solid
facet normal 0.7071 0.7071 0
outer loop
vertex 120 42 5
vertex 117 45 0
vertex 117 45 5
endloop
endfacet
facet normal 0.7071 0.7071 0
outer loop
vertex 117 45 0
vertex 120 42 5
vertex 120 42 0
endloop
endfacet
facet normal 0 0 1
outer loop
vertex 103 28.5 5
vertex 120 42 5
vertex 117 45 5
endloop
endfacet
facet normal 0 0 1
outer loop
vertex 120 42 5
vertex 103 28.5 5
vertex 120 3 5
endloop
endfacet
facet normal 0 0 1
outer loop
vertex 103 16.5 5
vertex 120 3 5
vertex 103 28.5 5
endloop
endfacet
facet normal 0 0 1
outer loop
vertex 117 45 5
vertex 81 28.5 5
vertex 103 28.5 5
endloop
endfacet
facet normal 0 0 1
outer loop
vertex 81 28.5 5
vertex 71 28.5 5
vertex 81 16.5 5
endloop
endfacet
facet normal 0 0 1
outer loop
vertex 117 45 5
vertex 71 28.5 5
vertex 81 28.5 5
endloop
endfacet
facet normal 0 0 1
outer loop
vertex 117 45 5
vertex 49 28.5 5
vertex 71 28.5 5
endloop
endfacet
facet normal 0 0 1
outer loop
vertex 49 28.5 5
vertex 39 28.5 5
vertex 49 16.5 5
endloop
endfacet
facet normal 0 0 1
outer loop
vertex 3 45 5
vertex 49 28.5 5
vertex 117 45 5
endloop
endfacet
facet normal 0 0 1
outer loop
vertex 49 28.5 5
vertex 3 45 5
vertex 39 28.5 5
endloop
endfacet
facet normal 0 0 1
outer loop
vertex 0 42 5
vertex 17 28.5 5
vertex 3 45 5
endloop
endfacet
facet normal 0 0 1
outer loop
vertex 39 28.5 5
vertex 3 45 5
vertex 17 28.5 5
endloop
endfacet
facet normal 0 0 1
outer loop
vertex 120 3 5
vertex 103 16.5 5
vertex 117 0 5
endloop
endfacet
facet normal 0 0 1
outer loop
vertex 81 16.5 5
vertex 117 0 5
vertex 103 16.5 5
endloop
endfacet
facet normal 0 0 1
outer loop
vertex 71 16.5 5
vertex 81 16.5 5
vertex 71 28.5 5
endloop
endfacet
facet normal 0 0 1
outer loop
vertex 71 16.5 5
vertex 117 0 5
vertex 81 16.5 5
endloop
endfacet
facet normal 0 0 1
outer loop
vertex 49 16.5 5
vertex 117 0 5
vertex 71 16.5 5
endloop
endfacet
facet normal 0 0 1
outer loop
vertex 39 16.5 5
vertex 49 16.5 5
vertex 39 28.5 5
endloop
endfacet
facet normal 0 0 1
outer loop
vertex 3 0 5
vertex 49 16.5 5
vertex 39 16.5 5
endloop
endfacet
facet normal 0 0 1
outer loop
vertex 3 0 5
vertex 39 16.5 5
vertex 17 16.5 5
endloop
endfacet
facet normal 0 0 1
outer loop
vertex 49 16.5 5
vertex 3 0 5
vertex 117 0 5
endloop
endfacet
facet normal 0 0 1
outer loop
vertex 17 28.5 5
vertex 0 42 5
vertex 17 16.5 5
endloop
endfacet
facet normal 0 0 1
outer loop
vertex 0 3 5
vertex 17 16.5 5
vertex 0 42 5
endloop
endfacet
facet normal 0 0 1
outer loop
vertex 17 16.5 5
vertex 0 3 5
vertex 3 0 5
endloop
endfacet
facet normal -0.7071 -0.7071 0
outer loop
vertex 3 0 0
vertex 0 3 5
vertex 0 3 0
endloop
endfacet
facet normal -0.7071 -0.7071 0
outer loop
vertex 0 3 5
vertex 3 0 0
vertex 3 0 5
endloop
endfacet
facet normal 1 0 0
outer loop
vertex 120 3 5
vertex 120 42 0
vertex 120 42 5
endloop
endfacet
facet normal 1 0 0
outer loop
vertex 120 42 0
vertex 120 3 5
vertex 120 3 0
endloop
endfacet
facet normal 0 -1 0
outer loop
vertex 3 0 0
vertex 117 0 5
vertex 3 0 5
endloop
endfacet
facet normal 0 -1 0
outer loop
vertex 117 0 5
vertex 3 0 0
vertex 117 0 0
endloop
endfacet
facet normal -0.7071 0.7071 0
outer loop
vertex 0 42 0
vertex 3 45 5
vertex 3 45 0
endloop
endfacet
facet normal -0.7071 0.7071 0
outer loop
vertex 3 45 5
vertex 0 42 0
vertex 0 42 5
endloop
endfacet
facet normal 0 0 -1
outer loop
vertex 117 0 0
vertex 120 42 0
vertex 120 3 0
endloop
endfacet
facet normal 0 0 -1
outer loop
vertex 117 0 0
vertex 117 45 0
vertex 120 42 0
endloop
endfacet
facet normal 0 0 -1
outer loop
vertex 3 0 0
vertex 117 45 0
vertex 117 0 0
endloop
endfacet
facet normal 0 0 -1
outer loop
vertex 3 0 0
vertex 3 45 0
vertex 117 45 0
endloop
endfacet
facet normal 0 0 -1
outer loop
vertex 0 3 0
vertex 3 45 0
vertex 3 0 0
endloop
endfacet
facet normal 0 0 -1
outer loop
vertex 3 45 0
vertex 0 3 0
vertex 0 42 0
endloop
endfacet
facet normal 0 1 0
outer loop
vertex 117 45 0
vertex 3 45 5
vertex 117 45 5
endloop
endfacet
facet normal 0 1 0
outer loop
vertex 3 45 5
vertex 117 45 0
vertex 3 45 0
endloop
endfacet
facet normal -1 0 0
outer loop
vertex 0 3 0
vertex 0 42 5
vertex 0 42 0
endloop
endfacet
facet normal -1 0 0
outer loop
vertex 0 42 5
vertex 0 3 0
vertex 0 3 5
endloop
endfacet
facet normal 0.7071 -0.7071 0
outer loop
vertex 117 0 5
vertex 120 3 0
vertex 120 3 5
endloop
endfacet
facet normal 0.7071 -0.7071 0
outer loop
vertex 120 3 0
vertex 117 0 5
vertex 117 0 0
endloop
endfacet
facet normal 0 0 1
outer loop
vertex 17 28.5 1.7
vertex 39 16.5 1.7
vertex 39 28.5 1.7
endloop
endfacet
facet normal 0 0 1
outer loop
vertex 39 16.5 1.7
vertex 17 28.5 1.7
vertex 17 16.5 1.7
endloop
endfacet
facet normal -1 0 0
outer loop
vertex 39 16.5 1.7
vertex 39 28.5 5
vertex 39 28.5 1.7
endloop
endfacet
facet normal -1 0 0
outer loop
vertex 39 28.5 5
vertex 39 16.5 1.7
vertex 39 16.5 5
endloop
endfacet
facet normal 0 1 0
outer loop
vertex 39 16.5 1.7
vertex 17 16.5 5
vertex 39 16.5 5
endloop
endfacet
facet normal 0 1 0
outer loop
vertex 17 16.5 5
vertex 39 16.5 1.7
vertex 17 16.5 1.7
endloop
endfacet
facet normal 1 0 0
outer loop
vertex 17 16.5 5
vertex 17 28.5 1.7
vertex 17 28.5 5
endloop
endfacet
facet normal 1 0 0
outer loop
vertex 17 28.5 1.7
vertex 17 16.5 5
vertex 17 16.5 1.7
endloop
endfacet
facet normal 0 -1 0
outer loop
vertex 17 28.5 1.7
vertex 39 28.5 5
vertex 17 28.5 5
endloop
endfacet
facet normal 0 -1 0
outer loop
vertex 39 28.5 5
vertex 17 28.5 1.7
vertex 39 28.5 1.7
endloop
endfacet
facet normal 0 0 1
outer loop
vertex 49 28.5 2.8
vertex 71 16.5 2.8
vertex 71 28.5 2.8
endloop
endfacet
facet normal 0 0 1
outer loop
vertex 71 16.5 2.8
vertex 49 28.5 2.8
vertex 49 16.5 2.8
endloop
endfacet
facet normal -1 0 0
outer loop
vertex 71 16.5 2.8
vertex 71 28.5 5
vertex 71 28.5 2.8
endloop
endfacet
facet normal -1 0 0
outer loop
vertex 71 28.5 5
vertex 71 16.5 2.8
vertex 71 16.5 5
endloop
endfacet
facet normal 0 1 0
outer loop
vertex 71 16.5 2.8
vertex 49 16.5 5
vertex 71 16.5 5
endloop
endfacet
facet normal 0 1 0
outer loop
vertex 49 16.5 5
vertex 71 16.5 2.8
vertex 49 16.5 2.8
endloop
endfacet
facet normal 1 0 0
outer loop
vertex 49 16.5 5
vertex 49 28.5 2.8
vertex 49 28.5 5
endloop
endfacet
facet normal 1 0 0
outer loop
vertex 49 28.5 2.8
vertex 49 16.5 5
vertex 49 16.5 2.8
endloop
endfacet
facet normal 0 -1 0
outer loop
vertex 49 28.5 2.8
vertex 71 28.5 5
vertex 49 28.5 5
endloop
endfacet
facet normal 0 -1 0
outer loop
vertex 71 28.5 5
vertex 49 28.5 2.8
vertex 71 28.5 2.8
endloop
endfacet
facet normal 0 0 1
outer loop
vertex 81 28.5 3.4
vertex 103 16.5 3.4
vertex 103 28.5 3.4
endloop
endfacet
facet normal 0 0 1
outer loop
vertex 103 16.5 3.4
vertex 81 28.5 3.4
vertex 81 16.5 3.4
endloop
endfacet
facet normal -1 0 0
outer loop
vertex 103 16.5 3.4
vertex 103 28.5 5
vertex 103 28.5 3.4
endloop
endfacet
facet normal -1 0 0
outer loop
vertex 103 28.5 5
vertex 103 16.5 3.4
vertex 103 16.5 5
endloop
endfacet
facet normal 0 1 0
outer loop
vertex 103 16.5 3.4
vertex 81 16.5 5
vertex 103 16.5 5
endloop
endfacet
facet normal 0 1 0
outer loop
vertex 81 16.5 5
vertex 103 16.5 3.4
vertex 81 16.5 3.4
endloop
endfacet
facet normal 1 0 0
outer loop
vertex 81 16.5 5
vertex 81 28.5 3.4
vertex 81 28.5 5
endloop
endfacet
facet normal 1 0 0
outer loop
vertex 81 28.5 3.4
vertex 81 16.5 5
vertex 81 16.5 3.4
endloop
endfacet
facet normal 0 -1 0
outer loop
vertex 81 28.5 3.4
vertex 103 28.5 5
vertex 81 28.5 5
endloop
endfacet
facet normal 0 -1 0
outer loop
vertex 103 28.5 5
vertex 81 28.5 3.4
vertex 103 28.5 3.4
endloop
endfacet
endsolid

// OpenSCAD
$fn = 32;

// ----------------------------------------------------------------------
// Windowed plate: 3 voids, 120 x 45 x 5 mm
// ----------------------------------------------------------------------

// --- parameters (mm) ---
plate_l = 120;            // plate length, X
plate_w = 45;             // plate width, Y
plate_t = 5;              // plate thickness, Z
edge_margin = 12;         // wall from the plate edge to any window
windows = 3;              // number of windows in the row
win_l = 22;               // window length
win_w = 12;               // window width
win_pitch = 32;           // window pitch along X
depth_1 = 3.3;            // depth of void 1 (full thickness = through)
depth_2 = 2.2;            // depth of void 2 (full thickness = through)
depth_3 = 1.6;            // depth of void 3 (full thickness = through)
corner_c = 3;             // corner chamfer of the plate

profile = [[3, 0], [117, 0], [120, 3], [120, 42], [117, 45], [3, 45], [0, 42], [0, 3]];  // primary outline, 8 points, counter clockwise
void_1 = [[17, 16.5], [39, 16.5], [39, 28.5], [17, 28.5]];  // window 1 of the row, 4 points
void_2 = [[49, 16.5], [71, 16.5], [71, 28.5], [49, 28.5]];  // window 2 of the row, 4 points
void_3 = [[81, 16.5], [103, 16.5], [103, 28.5], [81, 28.5]];  // window 3 of the row, 4 points

// --- the one profile operation ---
difference() {
  linear_extrude(height = plate_t) polygon(points = profile);
  translate([0, 0, plate_t - depth_1])
    linear_extrude(height = depth_1 + 1) polygon(points = void_1);
  translate([0, 0, plate_t - depth_2])
    linear_extrude(height = depth_2 + 1) polygon(points = void_2);
  translate([0, 0, plate_t - depth_3])
    linear_extrude(height = depth_3 + 1) polygon(points = void_3);
}
